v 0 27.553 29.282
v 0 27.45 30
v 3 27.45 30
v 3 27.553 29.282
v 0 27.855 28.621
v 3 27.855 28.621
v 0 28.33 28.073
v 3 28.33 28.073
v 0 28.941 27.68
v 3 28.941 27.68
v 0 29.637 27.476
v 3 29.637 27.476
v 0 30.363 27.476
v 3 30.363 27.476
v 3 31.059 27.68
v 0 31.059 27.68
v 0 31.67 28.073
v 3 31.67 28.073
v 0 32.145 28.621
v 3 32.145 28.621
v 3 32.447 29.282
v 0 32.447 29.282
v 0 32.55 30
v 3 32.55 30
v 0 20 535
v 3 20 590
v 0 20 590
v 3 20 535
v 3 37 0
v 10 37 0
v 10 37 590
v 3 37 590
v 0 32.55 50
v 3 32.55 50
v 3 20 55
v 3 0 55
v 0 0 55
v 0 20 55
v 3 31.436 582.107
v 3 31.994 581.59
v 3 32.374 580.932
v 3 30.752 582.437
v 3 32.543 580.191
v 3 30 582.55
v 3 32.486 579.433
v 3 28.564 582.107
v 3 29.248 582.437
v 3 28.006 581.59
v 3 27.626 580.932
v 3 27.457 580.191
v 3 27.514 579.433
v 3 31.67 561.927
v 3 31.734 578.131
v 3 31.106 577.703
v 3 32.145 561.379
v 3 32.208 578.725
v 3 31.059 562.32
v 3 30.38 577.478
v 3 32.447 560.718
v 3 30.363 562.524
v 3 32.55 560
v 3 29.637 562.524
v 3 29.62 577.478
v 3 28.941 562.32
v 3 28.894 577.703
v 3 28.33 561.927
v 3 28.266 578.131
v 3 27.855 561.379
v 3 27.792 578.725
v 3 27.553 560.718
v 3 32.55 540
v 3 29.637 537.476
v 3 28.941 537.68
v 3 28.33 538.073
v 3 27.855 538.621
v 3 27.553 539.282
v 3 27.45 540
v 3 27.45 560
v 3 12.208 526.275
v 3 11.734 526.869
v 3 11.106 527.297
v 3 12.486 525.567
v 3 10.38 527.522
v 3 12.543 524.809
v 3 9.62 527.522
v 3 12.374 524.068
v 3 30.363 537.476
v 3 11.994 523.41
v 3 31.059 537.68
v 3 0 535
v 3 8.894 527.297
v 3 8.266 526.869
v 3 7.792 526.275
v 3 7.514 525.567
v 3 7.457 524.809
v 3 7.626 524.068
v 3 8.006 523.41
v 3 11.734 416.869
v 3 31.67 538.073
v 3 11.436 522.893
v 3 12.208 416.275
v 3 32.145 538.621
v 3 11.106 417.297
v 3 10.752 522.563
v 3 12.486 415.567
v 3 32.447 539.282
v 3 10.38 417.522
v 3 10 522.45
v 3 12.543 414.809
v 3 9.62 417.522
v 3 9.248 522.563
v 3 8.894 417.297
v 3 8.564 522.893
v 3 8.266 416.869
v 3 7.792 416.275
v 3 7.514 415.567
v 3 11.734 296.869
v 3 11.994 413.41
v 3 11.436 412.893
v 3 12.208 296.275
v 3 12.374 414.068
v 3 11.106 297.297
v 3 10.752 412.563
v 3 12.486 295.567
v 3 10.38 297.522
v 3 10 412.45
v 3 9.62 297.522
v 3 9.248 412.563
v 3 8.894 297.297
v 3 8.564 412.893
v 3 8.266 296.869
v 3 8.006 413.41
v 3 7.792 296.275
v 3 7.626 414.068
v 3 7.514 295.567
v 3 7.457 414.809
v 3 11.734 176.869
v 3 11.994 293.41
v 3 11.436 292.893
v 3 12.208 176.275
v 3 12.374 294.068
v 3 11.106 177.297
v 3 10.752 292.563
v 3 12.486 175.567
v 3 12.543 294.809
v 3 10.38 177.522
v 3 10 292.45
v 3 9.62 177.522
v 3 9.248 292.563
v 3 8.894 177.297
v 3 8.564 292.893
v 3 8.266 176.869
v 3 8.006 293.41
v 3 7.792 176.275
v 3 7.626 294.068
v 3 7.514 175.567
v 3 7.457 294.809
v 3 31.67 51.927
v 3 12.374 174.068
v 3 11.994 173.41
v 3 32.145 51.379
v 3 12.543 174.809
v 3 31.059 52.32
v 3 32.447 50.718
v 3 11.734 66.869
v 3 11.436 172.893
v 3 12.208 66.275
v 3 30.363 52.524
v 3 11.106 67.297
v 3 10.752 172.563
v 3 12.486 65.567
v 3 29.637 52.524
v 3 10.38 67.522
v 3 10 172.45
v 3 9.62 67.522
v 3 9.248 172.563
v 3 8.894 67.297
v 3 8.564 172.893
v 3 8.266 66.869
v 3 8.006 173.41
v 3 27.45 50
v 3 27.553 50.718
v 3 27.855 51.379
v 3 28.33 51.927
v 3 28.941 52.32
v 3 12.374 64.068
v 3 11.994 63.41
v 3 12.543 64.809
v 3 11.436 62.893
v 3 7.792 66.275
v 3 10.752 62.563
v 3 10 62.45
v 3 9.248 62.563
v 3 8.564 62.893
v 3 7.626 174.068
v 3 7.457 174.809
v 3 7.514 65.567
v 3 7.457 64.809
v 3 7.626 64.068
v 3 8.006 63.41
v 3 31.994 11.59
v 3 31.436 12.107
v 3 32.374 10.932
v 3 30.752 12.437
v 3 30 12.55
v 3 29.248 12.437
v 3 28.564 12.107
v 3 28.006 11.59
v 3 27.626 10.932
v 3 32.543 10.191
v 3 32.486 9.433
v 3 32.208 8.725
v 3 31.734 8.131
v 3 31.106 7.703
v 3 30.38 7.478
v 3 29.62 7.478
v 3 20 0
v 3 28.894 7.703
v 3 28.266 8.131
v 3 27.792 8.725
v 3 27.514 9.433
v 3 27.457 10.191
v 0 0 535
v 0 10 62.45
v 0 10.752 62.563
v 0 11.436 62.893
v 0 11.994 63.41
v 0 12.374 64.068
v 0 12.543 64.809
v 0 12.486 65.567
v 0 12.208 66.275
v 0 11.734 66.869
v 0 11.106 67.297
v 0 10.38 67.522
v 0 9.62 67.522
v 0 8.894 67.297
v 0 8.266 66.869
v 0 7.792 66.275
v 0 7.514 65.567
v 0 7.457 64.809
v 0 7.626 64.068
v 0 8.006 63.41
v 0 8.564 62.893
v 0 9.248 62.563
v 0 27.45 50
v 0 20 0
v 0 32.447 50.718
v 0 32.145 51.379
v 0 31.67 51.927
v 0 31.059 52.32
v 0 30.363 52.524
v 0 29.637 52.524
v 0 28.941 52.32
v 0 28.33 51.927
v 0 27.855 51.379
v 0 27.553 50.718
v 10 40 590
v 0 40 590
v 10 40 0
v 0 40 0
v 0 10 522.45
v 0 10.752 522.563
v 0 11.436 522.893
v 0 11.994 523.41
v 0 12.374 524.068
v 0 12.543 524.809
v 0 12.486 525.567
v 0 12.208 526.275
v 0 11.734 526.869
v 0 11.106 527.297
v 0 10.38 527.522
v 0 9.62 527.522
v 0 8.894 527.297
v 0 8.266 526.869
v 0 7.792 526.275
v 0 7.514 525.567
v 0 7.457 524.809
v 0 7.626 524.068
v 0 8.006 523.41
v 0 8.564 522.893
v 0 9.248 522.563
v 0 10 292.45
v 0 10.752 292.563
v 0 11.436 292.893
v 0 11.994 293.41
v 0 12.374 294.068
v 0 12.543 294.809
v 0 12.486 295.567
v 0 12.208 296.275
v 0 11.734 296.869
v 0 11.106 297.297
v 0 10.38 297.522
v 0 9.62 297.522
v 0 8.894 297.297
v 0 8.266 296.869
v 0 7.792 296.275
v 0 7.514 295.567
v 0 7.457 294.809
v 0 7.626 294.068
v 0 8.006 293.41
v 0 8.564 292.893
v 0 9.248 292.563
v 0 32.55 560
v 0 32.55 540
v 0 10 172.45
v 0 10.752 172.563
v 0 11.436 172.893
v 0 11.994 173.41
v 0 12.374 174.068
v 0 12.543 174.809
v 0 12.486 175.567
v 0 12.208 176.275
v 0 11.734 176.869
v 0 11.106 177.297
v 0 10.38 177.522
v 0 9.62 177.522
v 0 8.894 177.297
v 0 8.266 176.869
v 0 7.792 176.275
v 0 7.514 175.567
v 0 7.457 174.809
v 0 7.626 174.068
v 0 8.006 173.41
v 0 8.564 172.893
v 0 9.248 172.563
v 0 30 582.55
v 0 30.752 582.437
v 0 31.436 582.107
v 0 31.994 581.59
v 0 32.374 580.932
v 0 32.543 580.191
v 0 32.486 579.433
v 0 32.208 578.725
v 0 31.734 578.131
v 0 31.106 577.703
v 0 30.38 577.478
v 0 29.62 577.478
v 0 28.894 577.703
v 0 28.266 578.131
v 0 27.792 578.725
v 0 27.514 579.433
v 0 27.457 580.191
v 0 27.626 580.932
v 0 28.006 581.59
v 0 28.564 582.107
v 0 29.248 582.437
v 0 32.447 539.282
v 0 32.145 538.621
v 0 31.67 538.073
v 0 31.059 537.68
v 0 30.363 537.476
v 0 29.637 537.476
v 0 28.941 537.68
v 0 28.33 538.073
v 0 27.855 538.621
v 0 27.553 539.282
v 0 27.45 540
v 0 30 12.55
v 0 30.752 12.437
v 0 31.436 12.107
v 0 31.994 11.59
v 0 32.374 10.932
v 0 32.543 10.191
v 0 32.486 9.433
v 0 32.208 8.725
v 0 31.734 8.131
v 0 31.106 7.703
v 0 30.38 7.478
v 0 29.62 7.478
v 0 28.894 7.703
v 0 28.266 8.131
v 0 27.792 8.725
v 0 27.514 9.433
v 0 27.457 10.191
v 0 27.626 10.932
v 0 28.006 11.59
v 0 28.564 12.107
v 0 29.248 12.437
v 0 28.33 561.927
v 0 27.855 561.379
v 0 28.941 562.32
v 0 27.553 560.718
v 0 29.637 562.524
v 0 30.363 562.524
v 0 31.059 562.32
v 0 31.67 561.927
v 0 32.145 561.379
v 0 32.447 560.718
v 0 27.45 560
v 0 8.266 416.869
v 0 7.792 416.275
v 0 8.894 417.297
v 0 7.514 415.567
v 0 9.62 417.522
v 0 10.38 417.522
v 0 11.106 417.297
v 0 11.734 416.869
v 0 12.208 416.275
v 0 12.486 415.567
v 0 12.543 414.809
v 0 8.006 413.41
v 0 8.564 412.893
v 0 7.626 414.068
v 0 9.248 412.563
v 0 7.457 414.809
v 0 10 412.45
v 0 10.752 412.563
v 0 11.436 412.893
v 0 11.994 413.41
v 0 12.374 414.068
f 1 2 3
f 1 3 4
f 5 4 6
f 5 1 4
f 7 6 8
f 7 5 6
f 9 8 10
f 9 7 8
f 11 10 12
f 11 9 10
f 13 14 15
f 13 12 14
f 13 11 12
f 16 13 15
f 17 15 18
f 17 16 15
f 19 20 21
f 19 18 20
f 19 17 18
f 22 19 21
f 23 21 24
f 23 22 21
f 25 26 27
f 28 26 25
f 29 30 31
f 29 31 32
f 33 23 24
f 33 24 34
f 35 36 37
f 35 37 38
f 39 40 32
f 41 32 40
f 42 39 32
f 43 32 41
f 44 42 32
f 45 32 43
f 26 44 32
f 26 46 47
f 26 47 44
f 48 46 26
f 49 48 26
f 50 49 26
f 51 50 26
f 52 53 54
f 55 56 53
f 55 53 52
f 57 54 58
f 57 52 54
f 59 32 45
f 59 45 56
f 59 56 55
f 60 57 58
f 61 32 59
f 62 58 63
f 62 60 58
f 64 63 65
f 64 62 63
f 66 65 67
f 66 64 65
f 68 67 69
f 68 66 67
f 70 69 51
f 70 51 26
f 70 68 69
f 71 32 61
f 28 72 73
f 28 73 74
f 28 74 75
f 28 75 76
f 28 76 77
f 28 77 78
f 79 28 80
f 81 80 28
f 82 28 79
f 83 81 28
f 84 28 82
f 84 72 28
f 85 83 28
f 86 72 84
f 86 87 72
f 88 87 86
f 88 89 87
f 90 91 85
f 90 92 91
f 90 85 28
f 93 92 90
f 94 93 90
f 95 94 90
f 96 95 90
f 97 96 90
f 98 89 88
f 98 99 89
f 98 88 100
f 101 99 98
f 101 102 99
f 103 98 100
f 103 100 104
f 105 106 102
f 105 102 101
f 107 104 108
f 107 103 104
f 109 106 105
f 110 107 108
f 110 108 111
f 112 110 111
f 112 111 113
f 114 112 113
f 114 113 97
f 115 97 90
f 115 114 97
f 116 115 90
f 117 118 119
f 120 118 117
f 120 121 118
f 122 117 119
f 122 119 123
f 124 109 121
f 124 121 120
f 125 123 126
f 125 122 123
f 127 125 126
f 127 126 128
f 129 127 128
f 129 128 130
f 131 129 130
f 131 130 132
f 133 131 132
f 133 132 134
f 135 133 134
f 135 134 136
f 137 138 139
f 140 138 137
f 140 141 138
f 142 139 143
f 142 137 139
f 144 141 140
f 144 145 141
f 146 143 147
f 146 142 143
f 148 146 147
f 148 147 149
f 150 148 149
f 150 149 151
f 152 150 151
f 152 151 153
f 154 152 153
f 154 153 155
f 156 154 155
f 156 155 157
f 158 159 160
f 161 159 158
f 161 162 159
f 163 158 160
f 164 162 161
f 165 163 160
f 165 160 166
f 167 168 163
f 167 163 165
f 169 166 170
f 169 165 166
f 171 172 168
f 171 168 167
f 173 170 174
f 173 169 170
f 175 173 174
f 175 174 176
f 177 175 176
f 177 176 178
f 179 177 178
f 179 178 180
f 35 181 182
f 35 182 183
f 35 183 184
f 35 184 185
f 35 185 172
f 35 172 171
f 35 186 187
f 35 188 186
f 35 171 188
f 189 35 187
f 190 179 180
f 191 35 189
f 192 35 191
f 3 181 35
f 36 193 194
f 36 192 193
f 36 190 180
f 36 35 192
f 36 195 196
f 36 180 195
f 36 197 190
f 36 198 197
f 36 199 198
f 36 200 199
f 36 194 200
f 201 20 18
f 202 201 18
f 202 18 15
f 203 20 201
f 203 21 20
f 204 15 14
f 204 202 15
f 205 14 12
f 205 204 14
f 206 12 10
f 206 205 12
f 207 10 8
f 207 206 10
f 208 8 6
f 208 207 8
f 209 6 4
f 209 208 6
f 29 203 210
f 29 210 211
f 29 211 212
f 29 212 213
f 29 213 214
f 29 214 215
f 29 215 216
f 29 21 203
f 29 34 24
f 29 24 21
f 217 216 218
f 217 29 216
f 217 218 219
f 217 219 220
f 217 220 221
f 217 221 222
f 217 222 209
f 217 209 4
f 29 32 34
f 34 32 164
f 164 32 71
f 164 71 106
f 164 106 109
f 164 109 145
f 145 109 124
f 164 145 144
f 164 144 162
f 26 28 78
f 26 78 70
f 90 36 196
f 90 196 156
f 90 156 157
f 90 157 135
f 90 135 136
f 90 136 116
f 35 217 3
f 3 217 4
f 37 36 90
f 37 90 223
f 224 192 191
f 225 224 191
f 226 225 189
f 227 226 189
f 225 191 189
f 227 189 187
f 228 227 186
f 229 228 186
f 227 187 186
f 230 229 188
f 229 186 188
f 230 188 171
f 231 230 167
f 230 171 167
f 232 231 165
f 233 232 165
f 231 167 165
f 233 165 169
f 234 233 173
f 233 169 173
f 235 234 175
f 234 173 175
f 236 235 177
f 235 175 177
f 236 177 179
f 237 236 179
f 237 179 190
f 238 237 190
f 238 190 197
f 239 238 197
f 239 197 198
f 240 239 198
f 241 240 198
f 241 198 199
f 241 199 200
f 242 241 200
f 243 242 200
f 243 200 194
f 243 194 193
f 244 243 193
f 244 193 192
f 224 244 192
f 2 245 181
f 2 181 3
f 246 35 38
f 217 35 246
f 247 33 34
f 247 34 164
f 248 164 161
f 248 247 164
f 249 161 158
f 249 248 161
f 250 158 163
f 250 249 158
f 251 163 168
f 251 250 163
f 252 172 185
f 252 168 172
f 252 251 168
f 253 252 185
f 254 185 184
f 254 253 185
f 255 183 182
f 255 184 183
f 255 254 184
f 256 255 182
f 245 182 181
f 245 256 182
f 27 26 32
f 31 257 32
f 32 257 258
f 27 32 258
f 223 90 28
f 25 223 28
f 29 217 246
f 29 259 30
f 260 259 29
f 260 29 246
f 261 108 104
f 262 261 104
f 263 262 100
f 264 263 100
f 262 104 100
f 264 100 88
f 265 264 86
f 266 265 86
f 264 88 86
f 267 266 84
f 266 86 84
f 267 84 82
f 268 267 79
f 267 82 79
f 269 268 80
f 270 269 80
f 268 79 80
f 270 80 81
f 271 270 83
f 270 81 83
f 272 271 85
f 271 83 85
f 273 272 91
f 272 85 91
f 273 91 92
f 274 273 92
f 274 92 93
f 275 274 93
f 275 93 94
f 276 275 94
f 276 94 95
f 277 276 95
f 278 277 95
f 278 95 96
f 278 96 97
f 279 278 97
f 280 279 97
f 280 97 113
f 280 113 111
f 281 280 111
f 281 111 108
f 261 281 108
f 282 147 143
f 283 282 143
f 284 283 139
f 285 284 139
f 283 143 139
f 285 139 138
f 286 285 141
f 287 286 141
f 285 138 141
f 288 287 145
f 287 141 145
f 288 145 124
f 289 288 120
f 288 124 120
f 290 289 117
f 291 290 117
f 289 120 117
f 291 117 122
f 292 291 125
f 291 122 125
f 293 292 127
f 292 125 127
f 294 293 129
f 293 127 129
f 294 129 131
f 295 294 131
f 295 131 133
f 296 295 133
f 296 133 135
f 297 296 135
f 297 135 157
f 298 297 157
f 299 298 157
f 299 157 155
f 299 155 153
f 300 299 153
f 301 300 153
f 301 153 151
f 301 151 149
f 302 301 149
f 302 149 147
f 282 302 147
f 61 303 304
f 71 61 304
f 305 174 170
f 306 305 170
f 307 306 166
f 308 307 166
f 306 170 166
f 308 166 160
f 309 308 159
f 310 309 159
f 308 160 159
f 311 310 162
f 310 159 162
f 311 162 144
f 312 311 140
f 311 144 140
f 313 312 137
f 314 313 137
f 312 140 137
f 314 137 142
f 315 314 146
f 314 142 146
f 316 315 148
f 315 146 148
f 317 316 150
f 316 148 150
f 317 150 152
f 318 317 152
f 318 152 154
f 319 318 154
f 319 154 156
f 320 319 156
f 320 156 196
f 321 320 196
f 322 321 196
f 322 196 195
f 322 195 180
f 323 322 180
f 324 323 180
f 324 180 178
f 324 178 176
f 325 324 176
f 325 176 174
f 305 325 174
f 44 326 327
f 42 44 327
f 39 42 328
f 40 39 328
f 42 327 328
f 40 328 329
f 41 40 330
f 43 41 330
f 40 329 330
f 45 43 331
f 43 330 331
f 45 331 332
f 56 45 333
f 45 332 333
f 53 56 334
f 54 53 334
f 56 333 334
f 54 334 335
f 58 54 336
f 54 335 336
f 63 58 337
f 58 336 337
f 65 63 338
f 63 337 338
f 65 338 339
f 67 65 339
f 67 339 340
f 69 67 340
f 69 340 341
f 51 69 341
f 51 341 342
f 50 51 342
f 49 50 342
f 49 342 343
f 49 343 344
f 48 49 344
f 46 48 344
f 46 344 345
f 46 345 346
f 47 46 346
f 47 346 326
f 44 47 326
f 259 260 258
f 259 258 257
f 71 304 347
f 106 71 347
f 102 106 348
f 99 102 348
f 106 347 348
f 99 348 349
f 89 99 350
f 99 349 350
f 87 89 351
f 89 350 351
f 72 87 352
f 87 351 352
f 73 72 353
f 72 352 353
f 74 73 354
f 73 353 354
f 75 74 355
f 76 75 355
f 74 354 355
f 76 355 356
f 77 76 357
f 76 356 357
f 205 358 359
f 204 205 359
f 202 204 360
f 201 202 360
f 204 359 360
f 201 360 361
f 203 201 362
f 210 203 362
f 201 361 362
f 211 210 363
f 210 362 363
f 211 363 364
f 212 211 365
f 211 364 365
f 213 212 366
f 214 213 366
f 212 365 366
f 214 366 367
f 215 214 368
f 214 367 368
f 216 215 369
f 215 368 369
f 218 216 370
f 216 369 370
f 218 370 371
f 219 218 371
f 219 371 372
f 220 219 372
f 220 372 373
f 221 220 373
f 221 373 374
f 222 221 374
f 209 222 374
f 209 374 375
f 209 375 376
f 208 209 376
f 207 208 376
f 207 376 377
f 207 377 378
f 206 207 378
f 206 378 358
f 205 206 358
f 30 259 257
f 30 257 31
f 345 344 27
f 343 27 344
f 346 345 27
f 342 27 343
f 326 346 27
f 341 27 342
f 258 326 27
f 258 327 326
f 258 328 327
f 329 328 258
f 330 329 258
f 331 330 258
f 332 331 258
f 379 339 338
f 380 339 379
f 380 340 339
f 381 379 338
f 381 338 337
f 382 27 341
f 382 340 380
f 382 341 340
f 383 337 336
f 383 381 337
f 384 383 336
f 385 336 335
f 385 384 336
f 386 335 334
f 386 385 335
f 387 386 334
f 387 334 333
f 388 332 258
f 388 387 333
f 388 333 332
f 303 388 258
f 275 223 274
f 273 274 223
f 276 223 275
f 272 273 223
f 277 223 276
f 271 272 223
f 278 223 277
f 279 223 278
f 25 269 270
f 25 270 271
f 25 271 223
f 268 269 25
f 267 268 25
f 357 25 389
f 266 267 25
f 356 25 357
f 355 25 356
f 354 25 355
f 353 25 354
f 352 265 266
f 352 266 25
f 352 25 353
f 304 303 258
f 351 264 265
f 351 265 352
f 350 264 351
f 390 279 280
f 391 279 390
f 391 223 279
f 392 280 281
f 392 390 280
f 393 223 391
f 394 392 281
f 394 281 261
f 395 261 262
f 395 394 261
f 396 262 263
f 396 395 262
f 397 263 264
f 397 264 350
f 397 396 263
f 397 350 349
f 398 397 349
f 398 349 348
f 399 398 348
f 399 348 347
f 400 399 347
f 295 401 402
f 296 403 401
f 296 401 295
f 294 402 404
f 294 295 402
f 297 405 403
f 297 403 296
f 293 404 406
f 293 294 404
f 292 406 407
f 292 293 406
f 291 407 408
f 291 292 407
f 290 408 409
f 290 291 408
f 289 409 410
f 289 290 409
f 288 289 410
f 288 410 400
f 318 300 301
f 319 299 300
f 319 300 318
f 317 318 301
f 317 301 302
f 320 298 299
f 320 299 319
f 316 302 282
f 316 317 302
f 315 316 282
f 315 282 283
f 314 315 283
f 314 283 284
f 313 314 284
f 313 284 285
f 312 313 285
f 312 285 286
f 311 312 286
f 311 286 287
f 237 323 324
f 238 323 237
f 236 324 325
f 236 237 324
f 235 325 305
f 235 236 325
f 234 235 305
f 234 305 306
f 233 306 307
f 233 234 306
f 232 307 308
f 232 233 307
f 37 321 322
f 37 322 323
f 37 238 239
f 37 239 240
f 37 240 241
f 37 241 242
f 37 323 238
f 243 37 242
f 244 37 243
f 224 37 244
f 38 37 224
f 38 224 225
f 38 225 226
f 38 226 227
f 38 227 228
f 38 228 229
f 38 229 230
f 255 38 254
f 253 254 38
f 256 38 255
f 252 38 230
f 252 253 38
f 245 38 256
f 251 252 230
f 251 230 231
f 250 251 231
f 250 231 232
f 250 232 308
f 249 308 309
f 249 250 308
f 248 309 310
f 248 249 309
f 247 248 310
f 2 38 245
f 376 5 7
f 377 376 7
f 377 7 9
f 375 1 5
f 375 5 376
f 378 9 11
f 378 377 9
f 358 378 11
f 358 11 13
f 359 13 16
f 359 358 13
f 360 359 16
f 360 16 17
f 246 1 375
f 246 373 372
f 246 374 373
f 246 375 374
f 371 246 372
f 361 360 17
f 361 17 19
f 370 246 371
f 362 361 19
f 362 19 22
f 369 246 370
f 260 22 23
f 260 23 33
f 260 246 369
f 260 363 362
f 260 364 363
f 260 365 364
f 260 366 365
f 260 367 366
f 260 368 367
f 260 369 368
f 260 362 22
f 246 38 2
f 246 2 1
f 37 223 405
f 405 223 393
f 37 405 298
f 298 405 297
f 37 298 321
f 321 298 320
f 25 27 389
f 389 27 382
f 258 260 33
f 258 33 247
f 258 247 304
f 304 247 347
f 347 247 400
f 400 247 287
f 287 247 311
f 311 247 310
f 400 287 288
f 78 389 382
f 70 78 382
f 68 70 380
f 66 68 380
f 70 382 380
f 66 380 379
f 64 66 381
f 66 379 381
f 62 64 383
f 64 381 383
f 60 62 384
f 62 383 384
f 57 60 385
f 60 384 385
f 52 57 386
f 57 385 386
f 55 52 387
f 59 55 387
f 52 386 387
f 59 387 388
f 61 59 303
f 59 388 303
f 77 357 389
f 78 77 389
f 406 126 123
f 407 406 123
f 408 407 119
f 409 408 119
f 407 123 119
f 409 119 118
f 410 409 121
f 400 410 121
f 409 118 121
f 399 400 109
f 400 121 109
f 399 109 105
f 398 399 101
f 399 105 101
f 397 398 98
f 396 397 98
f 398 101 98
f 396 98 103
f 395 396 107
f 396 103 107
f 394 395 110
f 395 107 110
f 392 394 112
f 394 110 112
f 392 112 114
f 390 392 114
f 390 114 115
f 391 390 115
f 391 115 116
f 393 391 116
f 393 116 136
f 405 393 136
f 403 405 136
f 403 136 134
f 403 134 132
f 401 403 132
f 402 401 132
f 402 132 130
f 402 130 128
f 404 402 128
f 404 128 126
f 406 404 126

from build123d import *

# Parameters (mm, degrees)
BOSS_EXTRUDE1_DEPTH = 590
CUT_EXTRUDE3_REACH  = 5
SKETCH2_R           = 2.55
CUT_EXTRUDE5_REACH  = 5
SKETCH5_W           = 55
SKETCH5_H           = 20
CUT_EXTRUDE6_REACH  = 12
SKETCH6_R           = 2.55


with BuildPart() as part:
    # Sketch1 → Boss-Extrude1 (new body)
    with BuildSketch(Plane.XY):
        Polygon((0, 0), (0, 40), (10, 40), (10, 37), (3, 37), (3, 0), align=None)
    extrude(amount=BOSS_EXTRUDE1_DEPTH)

    # Sketch2 → Cut-Extrude3 (cut, up to next)
    with BuildSketch(Plane(origin=(3, 0, 0), x_dir=(0, 0, -1), z_dir=(1, 0, 0)), mode=Mode.PRIVATE) as cut_extrude3_sk1:
        with Locations((-525, 10)):
            Circle(SKETCH2_R)
    cut_extrude3_tool1 = extrude(cut_extrude3_sk1.sketch, amount=-CUT_EXTRUDE3_REACH, mode=Mode.PRIVATE) & part.part
    add(cut_extrude3_tool1.solids().sort_by_distance((3, 10, 525))[0], mode=Mode.SUBTRACT)
    # Sketch2 → Cut-Extrude3 (cut, up to next)
    with BuildSketch(Plane(origin=(3, 0, 0), x_dir=(0, 0, -1), z_dir=(1, 0, 0)), mode=Mode.PRIVATE) as cut_extrude3_sk2:
        with Locations((-295, 10)):
            Circle(SKETCH2_R)
    cut_extrude3_tool2 = extrude(cut_extrude3_sk2.sketch, amount=-CUT_EXTRUDE3_REACH, mode=Mode.PRIVATE) & part.part
    add(cut_extrude3_tool2.solids().sort_by_distance((3, 10, 295))[0], mode=Mode.SUBTRACT)
    # Sketch2 → Cut-Extrude3 (cut, up to next)
    with BuildSketch(Plane(origin=(3, 0, 0), x_dir=(0, 0, -1), z_dir=(1, 0, 0)), mode=Mode.PRIVATE) as cut_extrude3_sk3:
        with Locations((-415, 10)):
            Circle(SKETCH2_R)
    cut_extrude3_tool3 = extrude(cut_extrude3_sk3.sketch, amount=-CUT_EXTRUDE3_REACH, mode=Mode.PRIVATE) & part.part
    add(cut_extrude3_tool3.solids().sort_by_distance((3, 10, 415))[0], mode=Mode.SUBTRACT)
    # Sketch2 → Cut-Extrude3 (cut, up to next)
    with BuildSketch(Plane(origin=(3, 0, 0), x_dir=(0, 0, -1), z_dir=(1, 0, 0)), mode=Mode.PRIVATE) as cut_extrude3_sk4:
        with Locations((-175, 10)):
            Circle(SKETCH2_R)
    cut_extrude3_tool4 = extrude(cut_extrude3_sk4.sketch, amount=-CUT_EXTRUDE3_REACH, mode=Mode.PRIVATE) & part.part
    add(cut_extrude3_tool4.solids().sort_by_distance((3, 10, 175))[0], mode=Mode.SUBTRACT)
    # Sketch2 → Cut-Extrude3 (cut, up to next)
    with BuildSketch(Plane(origin=(3, 0, 0), x_dir=(0, 0, -1), z_dir=(1, 0, 0)), mode=Mode.PRIVATE) as cut_extrude3_sk5:
        with Locations((-65, 10)):
            Circle(SKETCH2_R)
    cut_extrude3_tool5 = extrude(cut_extrude3_sk5.sketch, amount=-CUT_EXTRUDE3_REACH, mode=Mode.PRIVATE) & part.part
    add(cut_extrude3_tool5.solids().sort_by_distance((3, 10, 65))[0], mode=Mode.SUBTRACT)

    # Sketch5 → Cut-Extrude5 (cut, up to next)
    with BuildSketch(Plane(origin=(3, 0, 0), x_dir=(0, 0, -1), z_dir=(1, 0, 0)), mode=Mode.PRIVATE) as cut_extrude5_sk1:
        with Locations((-562.5, 10)):
            Rectangle(SKETCH5_W, SKETCH5_H)
    cut_extrude5_tool1 = extrude(cut_extrude5_sk1.sketch, amount=-CUT_EXTRUDE5_REACH, mode=Mode.PRIVATE) & part.part
    add(cut_extrude5_tool1.solids().sort_by_distance((3, 10, 562.5))[0], mode=Mode.SUBTRACT)
    # Sketch5 → Cut-Extrude5 (cut, up to next)
    with BuildSketch(Plane(origin=(3, 0, 0), x_dir=(0, 0, -1), z_dir=(1, 0, 0)), mode=Mode.PRIVATE) as cut_extrude5_sk2:
        with Locations((-27.5, 10)):
            Rectangle(SKETCH5_W, SKETCH5_H)
    cut_extrude5_tool2 = extrude(cut_extrude5_sk2.sketch, amount=-CUT_EXTRUDE5_REACH, mode=Mode.PRIVATE) & part.part
    add(cut_extrude5_tool2.solids().sort_by_distance((3, 10, 27.5))[0], mode=Mode.SUBTRACT)

    # Sketch6 → Cut-Extrude6 (cut, up to next)
    with BuildSketch(Plane.ZY, mode=Mode.PRIVATE) as cut_extrude6_sk1:
        with Locations((10, 30)):
            Circle(SKETCH6_R)
    cut_extrude6_tool1 = extrude(cut_extrude6_sk1.sketch, amount=-CUT_EXTRUDE6_REACH, mode=Mode.PRIVATE) & part.part
    add(cut_extrude6_tool1.solids().sort_by_distance((0, 30, 10))[0], mode=Mode.SUBTRACT)
    # Sketch6 → Cut-Extrude6 (cut, up to next)
    with BuildSketch(Plane.ZY, mode=Mode.PRIVATE) as cut_extrude6_sk2:
        with Locations((580, 30)):
            Circle(SKETCH6_R)
    cut_extrude6_tool2 = extrude(cut_extrude6_sk2.sketch, amount=-CUT_EXTRUDE6_REACH, mode=Mode.PRIVATE) & part.part
    add(cut_extrude6_tool2.solids().sort_by_distance((0, 30, 580))[0], mode=Mode.SUBTRACT)
    # Sketch6 → Cut-Extrude6 (cut, up to next)
    with BuildSketch(Plane.ZY, mode=Mode.PRIVATE) as cut_extrude6_sk3:
        with BuildLine():
            Line((30, 32.55), (50, 32.55))
            ThreePointArc((50, 32.55), (52.55, 30), (50, 27.45))
            Line((50, 27.45), (30, 27.45))
            ThreePointArc((30, 27.45), (27.45, 30), (30, 32.55))
        make_face()
    cut_extrude6_tool3 = extrude(cut_extrude6_sk3.sketch, amount=-CUT_EXTRUDE6_REACH, mode=Mode.PRIVATE) & part.part
    add(cut_extrude6_tool3.solids().sort_by_distance((0, 30, 40))[0], mode=Mode.SUBTRACT)
    # Sketch6 → Cut-Extrude6 (cut, up to next)
    with BuildSketch(Plane.ZY, mode=Mode.PRIVATE) as cut_extrude6_sk4:
        with BuildLine():
            Line((560, 32.55), (540, 32.55))
            ThreePointArc((540, 32.55), (537.45, 30), (540, 27.45))
            Line((540, 27.45), (560, 27.45))
            ThreePointArc((560, 27.45), (562.55, 30), (560, 32.55))
        make_face()
    cut_extrude6_tool4 = extrude(cut_extrude6_sk4.sketch, amount=-CUT_EXTRUDE6_REACH, mode=Mode.PRIVATE) & part.part
    add(cut_extrude6_tool4.solids().sort_by_distance((0, 30, 550))[0], mode=Mode.SUBTRACT)


solid = part.part
